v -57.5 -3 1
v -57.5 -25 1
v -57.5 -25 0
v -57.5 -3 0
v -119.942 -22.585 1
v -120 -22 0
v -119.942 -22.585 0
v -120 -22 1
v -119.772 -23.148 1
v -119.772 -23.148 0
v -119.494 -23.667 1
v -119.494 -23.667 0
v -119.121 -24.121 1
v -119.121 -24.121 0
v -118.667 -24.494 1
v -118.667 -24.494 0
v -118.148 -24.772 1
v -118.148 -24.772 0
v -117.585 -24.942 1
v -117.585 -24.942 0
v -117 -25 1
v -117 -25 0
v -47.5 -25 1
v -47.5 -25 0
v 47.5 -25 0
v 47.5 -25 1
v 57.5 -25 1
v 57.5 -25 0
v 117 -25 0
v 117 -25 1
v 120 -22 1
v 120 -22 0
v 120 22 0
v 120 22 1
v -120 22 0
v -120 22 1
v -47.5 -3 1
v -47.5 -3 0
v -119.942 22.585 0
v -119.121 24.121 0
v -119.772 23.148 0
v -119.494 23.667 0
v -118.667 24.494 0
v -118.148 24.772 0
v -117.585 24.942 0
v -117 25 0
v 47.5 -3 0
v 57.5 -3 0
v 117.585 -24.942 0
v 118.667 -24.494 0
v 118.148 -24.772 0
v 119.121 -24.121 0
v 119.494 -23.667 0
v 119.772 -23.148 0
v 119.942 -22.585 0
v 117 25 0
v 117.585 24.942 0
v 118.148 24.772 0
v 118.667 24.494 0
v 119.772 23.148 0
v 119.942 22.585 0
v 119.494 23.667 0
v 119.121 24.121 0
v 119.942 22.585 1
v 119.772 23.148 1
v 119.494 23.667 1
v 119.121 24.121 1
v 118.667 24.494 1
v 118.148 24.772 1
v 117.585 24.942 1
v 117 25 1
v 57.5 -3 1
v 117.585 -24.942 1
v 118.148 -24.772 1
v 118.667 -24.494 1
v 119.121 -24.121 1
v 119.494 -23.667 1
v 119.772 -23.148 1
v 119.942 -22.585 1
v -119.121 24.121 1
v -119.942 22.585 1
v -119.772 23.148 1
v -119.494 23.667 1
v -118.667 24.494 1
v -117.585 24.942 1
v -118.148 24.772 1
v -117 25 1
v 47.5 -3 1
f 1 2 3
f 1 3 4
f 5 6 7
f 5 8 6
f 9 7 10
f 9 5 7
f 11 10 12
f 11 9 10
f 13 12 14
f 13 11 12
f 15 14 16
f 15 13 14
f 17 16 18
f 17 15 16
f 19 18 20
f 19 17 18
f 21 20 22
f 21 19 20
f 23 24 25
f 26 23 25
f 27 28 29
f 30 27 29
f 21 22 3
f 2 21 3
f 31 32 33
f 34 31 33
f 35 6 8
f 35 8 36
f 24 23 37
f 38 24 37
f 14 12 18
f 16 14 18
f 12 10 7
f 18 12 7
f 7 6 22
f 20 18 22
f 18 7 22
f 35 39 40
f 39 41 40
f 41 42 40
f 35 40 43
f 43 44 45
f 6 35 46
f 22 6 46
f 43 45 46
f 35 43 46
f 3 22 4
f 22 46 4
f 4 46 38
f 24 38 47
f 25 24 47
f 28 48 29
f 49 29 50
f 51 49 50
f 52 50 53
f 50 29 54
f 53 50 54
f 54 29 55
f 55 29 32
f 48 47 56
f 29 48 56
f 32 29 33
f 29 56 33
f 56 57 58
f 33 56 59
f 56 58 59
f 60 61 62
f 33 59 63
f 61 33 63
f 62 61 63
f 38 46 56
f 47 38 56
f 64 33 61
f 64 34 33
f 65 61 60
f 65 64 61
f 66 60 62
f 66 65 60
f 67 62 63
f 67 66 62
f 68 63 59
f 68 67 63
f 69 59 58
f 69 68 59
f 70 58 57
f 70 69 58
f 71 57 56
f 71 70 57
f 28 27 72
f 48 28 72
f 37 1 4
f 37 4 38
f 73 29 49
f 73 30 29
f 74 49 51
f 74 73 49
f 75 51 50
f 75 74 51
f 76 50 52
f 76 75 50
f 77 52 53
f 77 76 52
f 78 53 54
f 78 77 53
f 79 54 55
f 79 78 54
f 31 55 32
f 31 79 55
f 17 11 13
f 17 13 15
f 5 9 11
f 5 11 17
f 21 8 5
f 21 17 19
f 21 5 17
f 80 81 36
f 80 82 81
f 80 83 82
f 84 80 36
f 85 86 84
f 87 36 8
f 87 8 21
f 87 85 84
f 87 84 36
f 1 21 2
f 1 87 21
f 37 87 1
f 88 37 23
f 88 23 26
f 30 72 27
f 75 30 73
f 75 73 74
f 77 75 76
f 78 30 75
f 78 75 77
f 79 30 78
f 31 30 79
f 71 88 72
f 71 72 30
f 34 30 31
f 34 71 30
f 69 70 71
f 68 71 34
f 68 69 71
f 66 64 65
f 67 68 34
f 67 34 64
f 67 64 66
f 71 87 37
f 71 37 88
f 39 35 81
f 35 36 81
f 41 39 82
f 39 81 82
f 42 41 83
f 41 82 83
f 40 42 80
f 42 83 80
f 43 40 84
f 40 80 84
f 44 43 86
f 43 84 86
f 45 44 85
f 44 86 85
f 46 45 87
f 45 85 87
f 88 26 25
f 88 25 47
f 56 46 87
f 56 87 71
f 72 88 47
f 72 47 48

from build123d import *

# Parameters (mm, degrees)
SKETCH_1_W          = 240
SKETCH_1_H          = 50
EXTRUDE_1_DEPTH     = 1
FILLET_1_R          = 3
SKETCH_2_W          = 10
SKETCH_2_H          = 22
CUT_EXTRUDE_1_DEPTH = 123.580585739


with BuildPart() as part:
    # 草图1 → 凸台-拉伸1 (new body)
    with BuildSketch(Plane.XY):
        Rectangle(SKETCH_1_W, SKETCH_1_H)
    extrude(amount=EXTRUDE_1_DEPTH)

    # 圆角1
    fillet_1_edges = [part.edges().sort_by_distance(p)[0] for p in [
        (120, -25, 0.5),
        (-120, -25, 0.5),
        (-120, 25, 0.5),
        (120, 25, 0.5),
    ]]
    fillet(fillet_1_edges, radius=FILLET_1_R)

    # 草图2 → 切除-拉伸1 (cut, through all)
    with BuildSketch(Plane.XY.offset(1)):
        with Locations((-52.5, -14)):
            Rectangle(SKETCH_2_W, SKETCH_2_H)
        with Locations((52.5, -14)):
            Rectangle(SKETCH_2_W, SKETCH_2_H)
    extrude(amount=-CUT_EXTRUDE_1_DEPTH, mode=Mode.SUBTRACT)


solid = part.part
